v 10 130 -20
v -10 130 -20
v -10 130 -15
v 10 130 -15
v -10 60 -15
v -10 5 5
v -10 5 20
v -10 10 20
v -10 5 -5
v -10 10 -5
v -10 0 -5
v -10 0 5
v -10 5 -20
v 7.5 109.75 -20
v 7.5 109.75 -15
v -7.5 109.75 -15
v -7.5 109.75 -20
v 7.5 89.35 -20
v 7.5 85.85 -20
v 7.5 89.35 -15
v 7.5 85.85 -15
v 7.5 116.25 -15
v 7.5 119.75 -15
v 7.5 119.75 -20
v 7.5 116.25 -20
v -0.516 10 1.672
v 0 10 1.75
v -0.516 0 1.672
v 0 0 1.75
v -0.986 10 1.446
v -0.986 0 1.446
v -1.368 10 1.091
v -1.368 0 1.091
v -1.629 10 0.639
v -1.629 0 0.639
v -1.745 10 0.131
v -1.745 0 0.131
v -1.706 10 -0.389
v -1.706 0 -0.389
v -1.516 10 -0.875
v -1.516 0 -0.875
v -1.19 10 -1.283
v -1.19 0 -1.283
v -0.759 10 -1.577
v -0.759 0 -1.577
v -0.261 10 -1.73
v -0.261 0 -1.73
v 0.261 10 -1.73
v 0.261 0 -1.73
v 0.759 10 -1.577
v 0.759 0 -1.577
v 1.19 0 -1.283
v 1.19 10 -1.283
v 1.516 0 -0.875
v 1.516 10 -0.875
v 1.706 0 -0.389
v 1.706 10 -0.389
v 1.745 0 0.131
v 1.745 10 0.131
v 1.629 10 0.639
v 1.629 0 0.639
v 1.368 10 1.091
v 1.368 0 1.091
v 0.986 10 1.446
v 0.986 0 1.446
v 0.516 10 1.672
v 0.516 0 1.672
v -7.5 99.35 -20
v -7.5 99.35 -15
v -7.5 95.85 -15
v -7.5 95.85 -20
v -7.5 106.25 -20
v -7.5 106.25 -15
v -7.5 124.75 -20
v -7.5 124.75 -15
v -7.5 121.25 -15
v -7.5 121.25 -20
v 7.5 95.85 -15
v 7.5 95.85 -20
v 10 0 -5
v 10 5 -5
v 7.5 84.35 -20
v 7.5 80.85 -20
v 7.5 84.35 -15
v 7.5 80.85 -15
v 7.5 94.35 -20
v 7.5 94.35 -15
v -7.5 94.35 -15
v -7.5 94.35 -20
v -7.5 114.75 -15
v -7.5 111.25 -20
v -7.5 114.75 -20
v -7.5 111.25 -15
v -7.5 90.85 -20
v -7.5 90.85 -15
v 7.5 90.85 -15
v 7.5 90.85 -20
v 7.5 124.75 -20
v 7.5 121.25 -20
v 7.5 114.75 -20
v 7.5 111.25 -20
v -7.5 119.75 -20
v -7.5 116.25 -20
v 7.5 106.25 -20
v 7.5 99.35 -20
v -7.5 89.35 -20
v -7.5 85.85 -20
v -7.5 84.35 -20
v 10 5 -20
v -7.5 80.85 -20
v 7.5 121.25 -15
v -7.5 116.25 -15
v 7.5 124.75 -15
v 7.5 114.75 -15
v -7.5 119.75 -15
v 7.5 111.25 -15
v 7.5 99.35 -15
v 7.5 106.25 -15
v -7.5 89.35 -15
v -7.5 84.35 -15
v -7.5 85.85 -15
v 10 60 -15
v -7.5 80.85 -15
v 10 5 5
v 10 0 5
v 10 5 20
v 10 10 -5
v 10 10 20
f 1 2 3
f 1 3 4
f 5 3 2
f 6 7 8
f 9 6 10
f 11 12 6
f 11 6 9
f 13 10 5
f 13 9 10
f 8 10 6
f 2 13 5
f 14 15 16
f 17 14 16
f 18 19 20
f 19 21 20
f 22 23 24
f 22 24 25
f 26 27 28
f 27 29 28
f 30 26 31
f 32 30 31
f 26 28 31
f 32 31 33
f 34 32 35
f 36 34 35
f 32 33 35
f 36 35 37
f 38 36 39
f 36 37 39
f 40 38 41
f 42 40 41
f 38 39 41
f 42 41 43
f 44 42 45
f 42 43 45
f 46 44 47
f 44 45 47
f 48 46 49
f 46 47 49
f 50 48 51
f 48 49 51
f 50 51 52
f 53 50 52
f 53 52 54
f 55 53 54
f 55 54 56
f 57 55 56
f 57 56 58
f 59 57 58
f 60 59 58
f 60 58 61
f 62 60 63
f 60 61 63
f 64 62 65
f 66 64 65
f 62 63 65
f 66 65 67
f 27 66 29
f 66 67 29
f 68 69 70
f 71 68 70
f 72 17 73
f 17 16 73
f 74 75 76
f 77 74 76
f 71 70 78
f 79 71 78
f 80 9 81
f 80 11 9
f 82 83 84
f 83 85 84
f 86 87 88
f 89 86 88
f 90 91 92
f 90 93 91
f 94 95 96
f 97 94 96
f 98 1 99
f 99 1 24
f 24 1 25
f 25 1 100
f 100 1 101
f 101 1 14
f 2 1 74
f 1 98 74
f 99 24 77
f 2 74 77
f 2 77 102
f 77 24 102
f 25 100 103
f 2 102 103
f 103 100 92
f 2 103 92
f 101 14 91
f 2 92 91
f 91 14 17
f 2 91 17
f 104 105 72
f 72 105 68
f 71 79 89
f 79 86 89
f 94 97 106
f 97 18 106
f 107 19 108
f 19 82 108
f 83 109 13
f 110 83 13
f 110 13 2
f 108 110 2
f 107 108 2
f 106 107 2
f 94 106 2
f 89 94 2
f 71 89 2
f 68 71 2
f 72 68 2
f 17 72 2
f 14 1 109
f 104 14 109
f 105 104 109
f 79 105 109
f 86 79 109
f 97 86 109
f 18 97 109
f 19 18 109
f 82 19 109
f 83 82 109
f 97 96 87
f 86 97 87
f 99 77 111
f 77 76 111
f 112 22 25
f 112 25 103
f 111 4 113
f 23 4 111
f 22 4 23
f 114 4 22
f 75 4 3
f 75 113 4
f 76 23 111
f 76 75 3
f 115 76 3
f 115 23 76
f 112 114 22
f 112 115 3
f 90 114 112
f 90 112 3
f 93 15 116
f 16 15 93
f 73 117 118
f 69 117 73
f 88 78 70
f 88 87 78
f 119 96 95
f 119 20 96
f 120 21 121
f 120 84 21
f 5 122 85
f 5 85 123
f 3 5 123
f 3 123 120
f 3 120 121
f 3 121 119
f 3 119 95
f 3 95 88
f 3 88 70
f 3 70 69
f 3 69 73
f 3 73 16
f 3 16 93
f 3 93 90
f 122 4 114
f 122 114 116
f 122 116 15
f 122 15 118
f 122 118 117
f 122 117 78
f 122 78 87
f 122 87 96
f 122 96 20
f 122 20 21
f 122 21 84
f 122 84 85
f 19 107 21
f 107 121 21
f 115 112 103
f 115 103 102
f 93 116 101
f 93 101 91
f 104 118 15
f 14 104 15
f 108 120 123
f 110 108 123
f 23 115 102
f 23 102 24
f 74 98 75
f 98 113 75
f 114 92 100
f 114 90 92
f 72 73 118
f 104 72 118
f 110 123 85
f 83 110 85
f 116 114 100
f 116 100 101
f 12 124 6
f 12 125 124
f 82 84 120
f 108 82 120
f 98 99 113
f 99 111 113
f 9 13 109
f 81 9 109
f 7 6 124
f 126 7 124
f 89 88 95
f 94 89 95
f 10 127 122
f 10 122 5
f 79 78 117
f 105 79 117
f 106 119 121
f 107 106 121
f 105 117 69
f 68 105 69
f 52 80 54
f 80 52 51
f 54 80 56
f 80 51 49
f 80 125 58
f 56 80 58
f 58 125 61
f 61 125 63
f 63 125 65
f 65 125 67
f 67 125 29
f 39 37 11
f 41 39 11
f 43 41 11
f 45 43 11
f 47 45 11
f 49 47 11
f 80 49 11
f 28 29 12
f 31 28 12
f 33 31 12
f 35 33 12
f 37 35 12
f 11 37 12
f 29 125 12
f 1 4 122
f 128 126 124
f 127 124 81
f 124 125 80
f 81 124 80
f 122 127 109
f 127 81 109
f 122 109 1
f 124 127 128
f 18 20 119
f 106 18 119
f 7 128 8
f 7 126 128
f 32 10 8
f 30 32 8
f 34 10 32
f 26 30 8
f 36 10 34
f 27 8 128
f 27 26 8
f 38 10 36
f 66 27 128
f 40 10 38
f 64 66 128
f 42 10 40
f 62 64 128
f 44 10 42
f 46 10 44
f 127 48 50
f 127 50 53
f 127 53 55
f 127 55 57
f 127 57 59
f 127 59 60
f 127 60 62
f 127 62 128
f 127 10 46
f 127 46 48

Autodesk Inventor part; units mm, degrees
ref_plane "YZ Plane" through (0, 0, 0) normal (1, 0, 0) x (0, 1, 0)
ref_plane "XZ Plane" through (0, 0, 0) normal (0, 1, 0) x (-1, 0, 0)
ref_plane "XY Plane" through (0, 0, 0) normal (0, 0, 1) x (1, 0, 0)
sketch "Sketch1" plane through (0, 0, 0) normal (0, 1, 0) x (-1, 0, 0)
  line L0 (-10, 5) -> (10, 5)
  line L1 (10, 5) -> (10, -5)
  line L2 (10, -5) -> (-10, -5)
  line L3 (-10, -5) -> (-10, 5)
  line L4 (-10, 5) -> (10, -5) construction
  line L5 (10, 5) -> (-10, -5) construction
  point P0 (0, 0)
  dimension "d0" = 20
  dimension "d1" = 10
extrude "Extrusion1" add sketch "Sketch1" along normal blind 5
sketch "Sketch7" plane through (0, 5, 0) normal (0, 1, 0) x (1, 0, 0)
  line L0 (10, -20) -> (-10, -20)
  line L1 (-10, -20) -> (-10, 20)
  line L2 (-10, 20) -> (10, 20)
  line L3 (10, 20) -> (10, -20)
  line L4 (10, -20) -> (-10, 20) construction
  line L5 (-10, -20) -> (10, 20) construction
  point P0 (0, 0)
  dimension "d26" = 40
extrude "Extrusion4" add sketch "Sketch7" along normal blind 5
sketch "Sketch8" plane through (0, 10, 0) normal (0, 1, 0) x (1, 0, 0)
  line L0 (10, 20) -> (-10, 20) projected
  line L1 (10, 5) -> (10, 20) projected
  line L2 (-10, 20) -> (10, 20)
  line L3 (10, 20) -> (10, 15)
  line L4 (10, 15) -> (-10, 15)
  line L5 (-10, 15) -> (-10, 20)
  point P0 (0, 0)
  dimension "d29" = 5
extrude "Extrusion5" add sketch "Sketch8" along normal blind 120
sketch "Sketch9" plane through (0, 10, 0) normal (0, 1, 0) x (1, 0, 0)
  line L0 (10, 15) -> (-10, 15) projected
  line L1 (10, -20) -> (10, 15) projected
  line L2 (-10, 15) -> (10, 15)
  line L3 (10, 15) -> (10, 5)
  line L4 (10, 5) -> (-10, 5)
  line L5 (-10, 5) -> (-10, 15)
  point P0 (0, 0)
  dimension "d32" = 10
extrude "Extrusion6" add sketch "Sketch9" along normal blind 50
chamfer "Chamfer1" distance 10 distance2 50 1 edges at (0, 60, -5) measured on face at (-3.3333, 60, -11.6667)
sketch "Sketch10" plane through (0, 10, 0) normal (0, 1, 0) x (1, 0, 0)
  point P0 (0, 0)
  point P1 (0, 0)
hole "Hole3" at (0, 10, 0) direction (0, -1, 0) diameter 3.5 depth 10
sketch "Sketch11" plane through (-10, 130, -15) normal (0, 0, 1) x (1, 0, 0)
  line L0 (2.5, -8.75) -> (17.5, -8.75)
  line L1 (17.5, -8.75) -> (17.5, -5.25)
  line L2 (17.5, -5.25) -> (2.5, -5.25)
  line L3 (2.5, -5.25) -> (2.5, -8.75)
  line L4 (2.5, -8.75) -> (17.5, -5.25) construction
  line L5 (17.5, -8.75) -> (2.5, -5.25) construction
  line L6 (2.5, -10.25) -> (17.5, -10.25)
  line L7 (17.5, -10.25) -> (17.5, -13.75)
  line L8 (17.5, -13.75) -> (2.5, -13.75)
  line L9 (2.5, -13.75) -> (2.5, -10.25)
  line L10 (2.5, -10.25) -> (17.5, -13.75) construction
  line L11 (17.5, -10.25) -> (2.5, -13.75) construction
  line L12 (2.5, -15.25) -> (17.5, -15.25)
  line L13 (17.5, -15.25) -> (17.5, -18.75)
  line L14 (17.5, -18.75) -> (2.5, -18.75)
  line L15 (2.5, -18.75) -> (2.5, -15.25)
  line L16 (2.5, -15.25) -> (17.5, -18.75) construction
  line L17 (17.5, -15.25) -> (2.5, -18.75) construction
  line L18 (2.5, -23.75) -> (17.5, -23.75)
  line L19 (17.5, -23.75) -> (17.5, -20.25)
  line L20 (17.5, -20.25) -> (2.5, -20.25)
  line L21 (2.5, -20.25) -> (2.5, -23.75)
  line L22 (2.5, -23.75) -> (17.5, -20.25) construction
  line L23 (17.5, -23.75) -> (2.5, -20.25) construction
  line L24 (2.5, -34.15) -> (17.5, -34.15)
  line L25 (17.5, -34.15) -> (17.5, -30.65)
  line L26 (17.5, -30.65) -> (2.5, -30.65)
  line L27 (2.5, -30.65) -> (2.5, -34.15)
  line L28 (2.5, -34.15) -> (17.5, -30.65) construction
  line L29 (17.5, -34.15) -> (2.5, -30.65) construction
  line L30 (2.5, -39.15) -> (17.5, -39.15)
  line L31 (17.5, -39.15) -> (17.5, -35.65)
  line L32 (17.5, -35.65) -> (2.5, -35.65)
  line L33 (2.5, -35.65) -> (2.5, -39.15)
  line L34 (2.5, -39.15) -> (17.5, -35.65) construction
  line L35 (17.5, -39.15) -> (2.5, -35.65) construction
  line L36 (2.5, -44.15) -> (17.5, -44.15)
  line L37 (17.5, -44.15) -> (17.5, -40.65)
  line L38 (17.5, -40.65) -> (2.5, -40.65)
  line L39 (2.5, -40.65) -> (2.5, -44.15)
  line L40 (2.5, -44.15) -> (17.5, -40.65) construction
  line L41 (17.5, -44.15) -> (2.5, -40.65) construction
  line L42 (2.5, -49.15) -> (17.5, -49.15)
  line L43 (17.5, -49.15) -> (17.5, -45.65)
  line L44 (17.5, -45.65) -> (2.5, -45.65)
  line L45 (2.5, -45.65) -> (2.5, -49.15)
  line L46 (2.5, -49.15) -> (17.5, -45.65) construction
  line L47 (17.5, -49.15) -> (2.5, -45.65) construction
  point P0 (10, -130)
  point P1 (10, -7)
  point P2 (10, -32.4)
  point P3 (10, -12)
  point P4 (10, -37.4)
  point P5 (10, -17)
  point P6 (10, -42.4)
  point P7 (10, -22)
  point P8 (10, -47.4)
  dimension "d52" = 15
  dimension "d53" = 3.5
  dimension "d54" = 3.5
  dimension "d55" = 3.5
  dimension "d56" = 3.5
  dimension "d57" = 3.5
  dimension "d58" = 3.5
  dimension "d59" = 3.5
  dimension "d60" = 3.5
extrude "Extrusion7" cut sketch "Sketch11" against normal through all
properties part number "Indu_Holder"
